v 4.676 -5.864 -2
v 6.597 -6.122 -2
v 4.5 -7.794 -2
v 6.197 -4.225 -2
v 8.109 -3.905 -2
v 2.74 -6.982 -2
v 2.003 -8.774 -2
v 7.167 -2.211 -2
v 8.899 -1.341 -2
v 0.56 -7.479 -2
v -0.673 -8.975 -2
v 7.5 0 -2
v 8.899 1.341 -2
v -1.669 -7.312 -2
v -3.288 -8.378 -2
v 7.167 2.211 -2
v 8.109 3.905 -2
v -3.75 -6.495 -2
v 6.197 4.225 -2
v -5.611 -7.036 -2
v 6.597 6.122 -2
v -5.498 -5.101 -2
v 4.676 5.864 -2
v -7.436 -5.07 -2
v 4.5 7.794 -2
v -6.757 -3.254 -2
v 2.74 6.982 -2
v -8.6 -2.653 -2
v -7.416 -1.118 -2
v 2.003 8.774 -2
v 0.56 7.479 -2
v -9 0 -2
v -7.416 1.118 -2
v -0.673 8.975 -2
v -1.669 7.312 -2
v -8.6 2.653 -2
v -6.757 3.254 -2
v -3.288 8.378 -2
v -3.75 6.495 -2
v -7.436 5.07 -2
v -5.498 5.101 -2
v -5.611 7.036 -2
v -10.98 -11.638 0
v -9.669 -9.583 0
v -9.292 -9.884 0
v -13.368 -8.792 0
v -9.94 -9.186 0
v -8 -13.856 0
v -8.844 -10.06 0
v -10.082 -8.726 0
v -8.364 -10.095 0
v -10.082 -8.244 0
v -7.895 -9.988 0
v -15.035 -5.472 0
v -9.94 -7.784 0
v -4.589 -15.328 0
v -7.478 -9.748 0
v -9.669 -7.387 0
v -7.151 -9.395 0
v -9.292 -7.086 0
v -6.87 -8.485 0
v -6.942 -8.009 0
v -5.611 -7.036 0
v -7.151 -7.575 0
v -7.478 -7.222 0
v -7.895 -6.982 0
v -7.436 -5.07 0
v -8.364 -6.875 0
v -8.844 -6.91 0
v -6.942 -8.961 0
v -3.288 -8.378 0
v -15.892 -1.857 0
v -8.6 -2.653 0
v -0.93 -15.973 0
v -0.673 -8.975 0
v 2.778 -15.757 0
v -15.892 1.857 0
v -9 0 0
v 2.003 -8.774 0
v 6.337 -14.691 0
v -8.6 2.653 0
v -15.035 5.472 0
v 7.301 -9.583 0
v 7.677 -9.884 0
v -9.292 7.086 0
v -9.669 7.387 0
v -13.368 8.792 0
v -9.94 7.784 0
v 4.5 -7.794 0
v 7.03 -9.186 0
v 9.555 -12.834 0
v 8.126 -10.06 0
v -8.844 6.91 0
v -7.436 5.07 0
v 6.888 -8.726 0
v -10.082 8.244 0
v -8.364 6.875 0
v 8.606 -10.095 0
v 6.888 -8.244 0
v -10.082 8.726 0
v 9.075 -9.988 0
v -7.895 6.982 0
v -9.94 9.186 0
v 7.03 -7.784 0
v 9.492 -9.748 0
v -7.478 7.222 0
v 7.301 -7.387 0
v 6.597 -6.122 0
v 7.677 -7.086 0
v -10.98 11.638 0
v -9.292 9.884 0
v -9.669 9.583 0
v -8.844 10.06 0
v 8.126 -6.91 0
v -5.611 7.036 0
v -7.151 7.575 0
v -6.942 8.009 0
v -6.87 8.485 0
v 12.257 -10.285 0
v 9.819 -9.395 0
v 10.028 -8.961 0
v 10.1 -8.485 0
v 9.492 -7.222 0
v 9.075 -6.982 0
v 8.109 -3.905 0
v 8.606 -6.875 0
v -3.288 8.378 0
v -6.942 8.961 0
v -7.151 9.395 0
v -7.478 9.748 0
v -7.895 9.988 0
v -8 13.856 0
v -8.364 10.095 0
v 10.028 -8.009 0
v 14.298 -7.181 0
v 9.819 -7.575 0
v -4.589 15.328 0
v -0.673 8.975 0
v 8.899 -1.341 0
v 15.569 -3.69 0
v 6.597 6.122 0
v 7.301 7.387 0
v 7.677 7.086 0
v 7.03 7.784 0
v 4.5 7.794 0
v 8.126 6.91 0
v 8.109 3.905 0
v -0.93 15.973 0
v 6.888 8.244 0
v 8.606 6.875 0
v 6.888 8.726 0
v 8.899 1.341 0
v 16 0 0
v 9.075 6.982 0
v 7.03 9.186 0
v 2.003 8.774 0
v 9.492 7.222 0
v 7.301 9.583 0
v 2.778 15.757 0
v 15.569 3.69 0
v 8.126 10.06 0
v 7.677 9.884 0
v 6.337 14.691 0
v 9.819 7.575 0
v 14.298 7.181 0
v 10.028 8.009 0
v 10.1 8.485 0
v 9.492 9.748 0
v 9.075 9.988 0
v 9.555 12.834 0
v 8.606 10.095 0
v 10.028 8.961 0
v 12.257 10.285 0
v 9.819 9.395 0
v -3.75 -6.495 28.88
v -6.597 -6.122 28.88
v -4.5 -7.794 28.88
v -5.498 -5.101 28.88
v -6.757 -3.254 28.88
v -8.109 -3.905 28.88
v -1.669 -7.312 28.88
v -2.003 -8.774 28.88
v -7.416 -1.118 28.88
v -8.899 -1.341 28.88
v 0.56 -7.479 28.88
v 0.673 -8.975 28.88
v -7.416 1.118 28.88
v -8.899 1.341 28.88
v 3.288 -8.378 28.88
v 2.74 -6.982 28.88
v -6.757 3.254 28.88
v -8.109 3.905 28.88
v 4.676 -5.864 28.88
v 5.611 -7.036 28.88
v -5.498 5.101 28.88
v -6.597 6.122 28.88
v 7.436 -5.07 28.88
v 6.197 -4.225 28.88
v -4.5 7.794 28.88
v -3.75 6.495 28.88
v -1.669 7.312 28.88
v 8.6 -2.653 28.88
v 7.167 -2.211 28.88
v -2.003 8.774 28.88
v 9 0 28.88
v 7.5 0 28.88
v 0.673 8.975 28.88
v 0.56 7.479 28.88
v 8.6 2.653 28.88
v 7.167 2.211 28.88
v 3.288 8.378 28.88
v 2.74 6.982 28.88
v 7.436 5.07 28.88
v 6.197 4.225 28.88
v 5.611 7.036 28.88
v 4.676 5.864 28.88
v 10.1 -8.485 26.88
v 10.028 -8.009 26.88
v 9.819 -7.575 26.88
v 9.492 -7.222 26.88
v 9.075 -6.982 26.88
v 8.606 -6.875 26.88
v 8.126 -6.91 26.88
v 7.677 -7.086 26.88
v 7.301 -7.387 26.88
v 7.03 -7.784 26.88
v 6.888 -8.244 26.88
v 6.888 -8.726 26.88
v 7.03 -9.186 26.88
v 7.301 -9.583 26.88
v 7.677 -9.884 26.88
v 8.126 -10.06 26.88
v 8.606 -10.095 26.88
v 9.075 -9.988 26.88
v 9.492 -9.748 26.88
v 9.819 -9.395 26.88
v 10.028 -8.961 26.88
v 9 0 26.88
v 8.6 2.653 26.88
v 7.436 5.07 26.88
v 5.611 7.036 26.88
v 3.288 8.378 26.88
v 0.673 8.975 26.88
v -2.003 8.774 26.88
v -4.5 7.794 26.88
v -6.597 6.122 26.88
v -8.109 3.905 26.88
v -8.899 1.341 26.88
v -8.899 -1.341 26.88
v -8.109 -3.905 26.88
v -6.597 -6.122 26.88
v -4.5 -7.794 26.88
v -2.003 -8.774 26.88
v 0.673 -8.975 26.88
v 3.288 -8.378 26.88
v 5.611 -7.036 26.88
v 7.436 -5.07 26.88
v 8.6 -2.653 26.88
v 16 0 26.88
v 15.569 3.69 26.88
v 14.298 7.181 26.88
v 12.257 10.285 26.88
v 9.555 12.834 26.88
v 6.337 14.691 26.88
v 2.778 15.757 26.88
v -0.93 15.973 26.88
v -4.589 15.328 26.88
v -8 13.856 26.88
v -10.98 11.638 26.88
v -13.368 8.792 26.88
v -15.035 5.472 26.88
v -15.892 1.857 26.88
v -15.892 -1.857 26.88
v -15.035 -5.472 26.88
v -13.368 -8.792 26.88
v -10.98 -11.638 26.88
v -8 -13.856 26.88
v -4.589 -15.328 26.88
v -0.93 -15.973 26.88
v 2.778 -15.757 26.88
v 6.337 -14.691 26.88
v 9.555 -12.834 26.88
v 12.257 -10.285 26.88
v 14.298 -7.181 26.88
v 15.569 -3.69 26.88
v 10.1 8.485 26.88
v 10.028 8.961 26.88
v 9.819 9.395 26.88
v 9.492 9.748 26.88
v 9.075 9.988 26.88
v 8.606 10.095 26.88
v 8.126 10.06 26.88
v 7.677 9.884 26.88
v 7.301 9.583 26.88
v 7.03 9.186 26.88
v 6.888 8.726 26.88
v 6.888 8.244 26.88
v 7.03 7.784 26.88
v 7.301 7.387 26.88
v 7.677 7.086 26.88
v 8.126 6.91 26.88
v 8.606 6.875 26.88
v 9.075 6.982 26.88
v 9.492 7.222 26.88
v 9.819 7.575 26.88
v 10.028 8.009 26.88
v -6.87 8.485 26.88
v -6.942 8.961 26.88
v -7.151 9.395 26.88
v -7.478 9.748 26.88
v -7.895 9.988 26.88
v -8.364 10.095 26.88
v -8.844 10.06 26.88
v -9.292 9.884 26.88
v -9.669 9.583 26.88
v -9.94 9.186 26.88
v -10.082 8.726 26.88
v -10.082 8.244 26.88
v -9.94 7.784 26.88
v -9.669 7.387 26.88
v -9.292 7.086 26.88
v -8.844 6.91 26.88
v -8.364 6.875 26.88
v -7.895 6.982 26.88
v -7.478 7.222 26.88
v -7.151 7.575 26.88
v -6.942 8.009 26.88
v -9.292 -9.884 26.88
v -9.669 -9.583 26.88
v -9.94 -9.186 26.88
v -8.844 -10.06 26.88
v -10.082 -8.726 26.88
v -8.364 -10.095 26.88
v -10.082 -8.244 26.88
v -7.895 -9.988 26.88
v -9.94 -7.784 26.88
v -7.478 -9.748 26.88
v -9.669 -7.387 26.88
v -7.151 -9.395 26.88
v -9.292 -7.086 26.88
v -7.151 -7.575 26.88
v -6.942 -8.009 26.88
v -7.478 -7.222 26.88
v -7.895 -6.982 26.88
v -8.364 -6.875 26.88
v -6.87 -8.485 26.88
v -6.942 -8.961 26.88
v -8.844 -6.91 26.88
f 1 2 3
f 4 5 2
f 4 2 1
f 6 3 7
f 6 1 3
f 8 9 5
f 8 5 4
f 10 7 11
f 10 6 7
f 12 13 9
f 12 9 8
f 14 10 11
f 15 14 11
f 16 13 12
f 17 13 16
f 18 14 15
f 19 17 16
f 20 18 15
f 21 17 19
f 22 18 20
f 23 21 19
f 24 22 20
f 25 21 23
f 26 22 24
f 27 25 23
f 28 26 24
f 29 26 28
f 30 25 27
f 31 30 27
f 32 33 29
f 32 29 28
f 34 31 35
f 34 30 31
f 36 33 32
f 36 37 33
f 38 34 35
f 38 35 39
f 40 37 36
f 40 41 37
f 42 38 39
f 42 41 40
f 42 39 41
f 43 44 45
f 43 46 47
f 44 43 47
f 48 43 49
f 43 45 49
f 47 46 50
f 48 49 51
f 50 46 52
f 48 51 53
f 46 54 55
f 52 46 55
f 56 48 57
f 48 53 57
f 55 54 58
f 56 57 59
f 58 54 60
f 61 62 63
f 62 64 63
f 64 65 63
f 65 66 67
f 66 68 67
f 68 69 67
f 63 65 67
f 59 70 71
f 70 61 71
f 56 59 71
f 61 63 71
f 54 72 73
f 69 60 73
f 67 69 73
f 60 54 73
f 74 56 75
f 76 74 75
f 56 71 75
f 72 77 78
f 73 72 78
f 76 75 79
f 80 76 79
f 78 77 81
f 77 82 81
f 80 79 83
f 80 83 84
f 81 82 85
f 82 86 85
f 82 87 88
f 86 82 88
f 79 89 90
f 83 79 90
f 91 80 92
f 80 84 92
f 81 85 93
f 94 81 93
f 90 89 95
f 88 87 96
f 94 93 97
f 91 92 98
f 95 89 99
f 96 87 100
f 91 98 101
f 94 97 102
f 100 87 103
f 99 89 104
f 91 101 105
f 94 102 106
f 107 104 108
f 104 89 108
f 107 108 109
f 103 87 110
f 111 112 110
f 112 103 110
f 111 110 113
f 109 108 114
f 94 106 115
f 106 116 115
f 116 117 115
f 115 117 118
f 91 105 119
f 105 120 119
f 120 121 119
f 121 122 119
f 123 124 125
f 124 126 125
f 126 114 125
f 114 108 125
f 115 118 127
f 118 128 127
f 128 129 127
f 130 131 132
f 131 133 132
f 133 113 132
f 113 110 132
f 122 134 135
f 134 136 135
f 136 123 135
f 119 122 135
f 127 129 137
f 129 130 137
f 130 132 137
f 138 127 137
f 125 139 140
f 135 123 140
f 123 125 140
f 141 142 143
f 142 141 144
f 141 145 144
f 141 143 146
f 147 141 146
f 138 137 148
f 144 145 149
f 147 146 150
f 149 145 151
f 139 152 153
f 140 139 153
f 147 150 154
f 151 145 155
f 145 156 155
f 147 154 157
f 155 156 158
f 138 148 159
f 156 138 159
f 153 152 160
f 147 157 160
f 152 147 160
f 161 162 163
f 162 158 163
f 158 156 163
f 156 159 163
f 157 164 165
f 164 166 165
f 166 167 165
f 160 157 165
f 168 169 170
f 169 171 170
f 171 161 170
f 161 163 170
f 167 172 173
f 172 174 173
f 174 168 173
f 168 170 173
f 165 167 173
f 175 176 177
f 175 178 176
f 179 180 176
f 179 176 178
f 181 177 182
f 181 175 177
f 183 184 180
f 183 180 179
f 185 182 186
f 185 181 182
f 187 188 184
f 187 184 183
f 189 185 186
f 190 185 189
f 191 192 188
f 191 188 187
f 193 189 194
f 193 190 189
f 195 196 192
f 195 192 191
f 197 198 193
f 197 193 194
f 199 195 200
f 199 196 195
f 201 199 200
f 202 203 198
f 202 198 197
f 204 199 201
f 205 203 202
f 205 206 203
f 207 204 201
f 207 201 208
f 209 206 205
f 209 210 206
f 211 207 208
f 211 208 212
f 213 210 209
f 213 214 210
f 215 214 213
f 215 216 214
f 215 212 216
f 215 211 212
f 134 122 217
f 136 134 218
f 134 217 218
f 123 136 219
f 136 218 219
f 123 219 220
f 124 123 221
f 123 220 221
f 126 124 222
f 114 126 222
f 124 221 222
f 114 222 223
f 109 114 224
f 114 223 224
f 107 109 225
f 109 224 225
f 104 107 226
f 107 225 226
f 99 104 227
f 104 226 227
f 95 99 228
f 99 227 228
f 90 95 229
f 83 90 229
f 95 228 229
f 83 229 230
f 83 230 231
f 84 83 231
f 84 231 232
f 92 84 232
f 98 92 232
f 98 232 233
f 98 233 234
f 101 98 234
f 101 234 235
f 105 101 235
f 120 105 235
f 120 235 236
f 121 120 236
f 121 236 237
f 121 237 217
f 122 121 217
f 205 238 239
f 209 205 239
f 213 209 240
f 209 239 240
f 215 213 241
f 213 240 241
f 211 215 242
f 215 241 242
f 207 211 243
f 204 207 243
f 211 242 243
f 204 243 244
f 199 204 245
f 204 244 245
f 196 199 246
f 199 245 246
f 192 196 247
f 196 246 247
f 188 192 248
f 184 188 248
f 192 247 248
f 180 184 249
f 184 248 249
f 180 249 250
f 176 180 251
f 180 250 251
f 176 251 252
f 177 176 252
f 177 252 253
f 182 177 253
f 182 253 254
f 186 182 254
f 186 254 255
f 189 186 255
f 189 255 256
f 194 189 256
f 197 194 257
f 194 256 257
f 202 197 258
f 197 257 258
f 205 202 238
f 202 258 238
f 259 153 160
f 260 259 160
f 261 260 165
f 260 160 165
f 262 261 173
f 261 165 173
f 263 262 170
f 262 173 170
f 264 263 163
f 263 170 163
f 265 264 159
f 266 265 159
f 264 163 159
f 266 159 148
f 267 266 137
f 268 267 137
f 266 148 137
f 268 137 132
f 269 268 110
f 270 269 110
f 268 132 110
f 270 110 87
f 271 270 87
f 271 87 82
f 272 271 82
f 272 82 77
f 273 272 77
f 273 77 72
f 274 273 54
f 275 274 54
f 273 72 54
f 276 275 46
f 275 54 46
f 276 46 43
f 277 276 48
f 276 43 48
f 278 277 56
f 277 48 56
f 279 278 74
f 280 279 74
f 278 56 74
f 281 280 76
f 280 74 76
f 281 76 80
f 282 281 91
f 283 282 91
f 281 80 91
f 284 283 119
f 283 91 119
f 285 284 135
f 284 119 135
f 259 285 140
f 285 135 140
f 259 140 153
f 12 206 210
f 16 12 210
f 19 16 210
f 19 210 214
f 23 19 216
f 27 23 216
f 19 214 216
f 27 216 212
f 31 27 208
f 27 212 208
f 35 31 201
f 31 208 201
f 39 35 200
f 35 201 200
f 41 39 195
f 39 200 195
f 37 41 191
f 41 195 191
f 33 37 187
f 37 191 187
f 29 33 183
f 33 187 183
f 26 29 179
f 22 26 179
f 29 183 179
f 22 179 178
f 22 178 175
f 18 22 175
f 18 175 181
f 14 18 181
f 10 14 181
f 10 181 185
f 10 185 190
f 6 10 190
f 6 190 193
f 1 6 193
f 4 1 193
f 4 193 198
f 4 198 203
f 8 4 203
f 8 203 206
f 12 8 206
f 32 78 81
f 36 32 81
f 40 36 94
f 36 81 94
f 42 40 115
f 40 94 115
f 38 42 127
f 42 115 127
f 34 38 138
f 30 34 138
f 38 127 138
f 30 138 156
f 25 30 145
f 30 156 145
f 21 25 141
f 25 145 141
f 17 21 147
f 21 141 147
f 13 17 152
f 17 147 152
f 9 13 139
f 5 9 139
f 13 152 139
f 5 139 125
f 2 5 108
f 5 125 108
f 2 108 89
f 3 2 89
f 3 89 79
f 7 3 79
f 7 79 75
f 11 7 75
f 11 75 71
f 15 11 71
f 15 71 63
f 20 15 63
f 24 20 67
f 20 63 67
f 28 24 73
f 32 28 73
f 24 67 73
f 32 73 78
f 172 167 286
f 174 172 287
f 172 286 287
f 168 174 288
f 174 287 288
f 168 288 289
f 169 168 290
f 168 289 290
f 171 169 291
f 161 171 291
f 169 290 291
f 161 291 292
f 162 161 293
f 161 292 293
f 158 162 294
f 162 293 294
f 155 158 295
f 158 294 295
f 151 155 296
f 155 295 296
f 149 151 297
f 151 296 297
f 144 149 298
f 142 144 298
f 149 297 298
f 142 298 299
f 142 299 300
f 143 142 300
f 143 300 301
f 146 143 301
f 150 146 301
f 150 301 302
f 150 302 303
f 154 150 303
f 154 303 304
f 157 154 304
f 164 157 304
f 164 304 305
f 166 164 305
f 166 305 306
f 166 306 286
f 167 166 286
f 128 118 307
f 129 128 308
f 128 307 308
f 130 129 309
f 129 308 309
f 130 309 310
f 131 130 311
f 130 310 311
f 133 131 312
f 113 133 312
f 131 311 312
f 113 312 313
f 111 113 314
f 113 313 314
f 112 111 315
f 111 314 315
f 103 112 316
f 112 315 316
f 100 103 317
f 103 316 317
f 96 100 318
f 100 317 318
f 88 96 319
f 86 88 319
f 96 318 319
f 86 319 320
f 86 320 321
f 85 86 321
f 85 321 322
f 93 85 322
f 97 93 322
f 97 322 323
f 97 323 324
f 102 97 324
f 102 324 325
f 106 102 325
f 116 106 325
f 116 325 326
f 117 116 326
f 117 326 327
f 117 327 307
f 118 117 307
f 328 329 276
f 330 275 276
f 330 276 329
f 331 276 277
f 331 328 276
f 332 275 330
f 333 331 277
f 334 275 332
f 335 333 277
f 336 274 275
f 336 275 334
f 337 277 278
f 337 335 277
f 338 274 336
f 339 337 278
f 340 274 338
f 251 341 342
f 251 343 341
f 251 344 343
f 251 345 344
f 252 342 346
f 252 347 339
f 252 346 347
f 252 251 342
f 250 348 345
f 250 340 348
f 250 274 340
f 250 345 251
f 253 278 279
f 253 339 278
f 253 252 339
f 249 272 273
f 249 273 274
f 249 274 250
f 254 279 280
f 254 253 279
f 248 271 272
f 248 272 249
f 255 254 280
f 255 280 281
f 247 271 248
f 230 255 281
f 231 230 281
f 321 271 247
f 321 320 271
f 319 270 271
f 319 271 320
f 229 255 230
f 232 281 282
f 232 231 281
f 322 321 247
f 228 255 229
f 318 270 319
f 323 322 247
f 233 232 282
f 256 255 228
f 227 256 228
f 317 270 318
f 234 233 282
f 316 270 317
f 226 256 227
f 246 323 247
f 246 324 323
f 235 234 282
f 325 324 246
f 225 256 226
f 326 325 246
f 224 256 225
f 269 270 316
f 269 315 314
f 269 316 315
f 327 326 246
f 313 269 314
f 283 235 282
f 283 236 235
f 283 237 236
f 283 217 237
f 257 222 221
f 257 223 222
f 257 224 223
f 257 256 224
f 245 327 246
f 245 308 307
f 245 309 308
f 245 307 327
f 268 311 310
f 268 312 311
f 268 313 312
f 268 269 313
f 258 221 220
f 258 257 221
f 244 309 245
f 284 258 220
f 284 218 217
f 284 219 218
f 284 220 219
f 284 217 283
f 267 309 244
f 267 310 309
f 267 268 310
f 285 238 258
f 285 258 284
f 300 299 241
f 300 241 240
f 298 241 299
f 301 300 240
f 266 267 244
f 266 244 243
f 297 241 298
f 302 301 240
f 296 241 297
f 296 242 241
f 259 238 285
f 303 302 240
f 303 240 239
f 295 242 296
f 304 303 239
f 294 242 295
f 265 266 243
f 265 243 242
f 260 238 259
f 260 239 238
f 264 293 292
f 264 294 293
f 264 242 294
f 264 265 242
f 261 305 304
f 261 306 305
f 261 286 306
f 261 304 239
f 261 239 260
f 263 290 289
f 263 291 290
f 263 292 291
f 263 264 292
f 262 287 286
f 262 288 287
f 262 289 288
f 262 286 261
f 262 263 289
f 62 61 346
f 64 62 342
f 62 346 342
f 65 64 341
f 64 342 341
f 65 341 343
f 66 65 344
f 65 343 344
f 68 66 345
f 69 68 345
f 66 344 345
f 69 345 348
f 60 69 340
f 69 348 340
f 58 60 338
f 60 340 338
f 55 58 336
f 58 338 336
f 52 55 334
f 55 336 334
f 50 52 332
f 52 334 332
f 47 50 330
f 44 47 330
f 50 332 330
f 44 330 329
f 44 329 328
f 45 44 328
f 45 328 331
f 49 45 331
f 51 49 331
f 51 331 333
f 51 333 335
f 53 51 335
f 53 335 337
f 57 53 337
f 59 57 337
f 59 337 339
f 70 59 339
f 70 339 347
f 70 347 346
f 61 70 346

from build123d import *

# Parameters (mm, degrees)
SKETCH1_R           = 16
BOSS_EXTRUDE1_DEPTH = 26.88
SKETCH4_R           = 9
BOSS_EXTRUDE2_DEPTH = 2
SKETCH5_R           = 9
BOSS_EXTRUDE3_DEPTH = 2
SKETCH6_R           = 7.5
CUT_EXTRUDE2_DEPTH  = 31.88
SKETCH7_R           = 1.615
CUT_EXTRUDE3_DEPTH  = 29.88


with BuildPart() as part:
    # Sketch1 → Boss-Extrude1 (new body)
    with BuildSketch(Plane.XY):
        Circle(SKETCH1_R)
    extrude(amount=BOSS_EXTRUDE1_DEPTH)

    # Sketch4 → Boss-Extrude2 (add)
    with BuildSketch(Plane.XY.offset(26.88)):
        Circle(SKETCH4_R)
    extrude(amount=BOSS_EXTRUDE2_DEPTH)

    # Sketch5 → Boss-Extrude3 (add)
    with BuildSketch(Plane(origin=(0, 0, 0), x_dir=(-1, 0, 0), z_dir=(0, 0, -1))):
        Circle(SKETCH5_R)
    extrude(amount=BOSS_EXTRUDE3_DEPTH)

    # Sketch6 → Cut-Extrude2 (cut, through all)
    with BuildSketch(Plane.XY.offset(28.88)):
        Circle(SKETCH6_R)
    extrude(amount=-CUT_EXTRUDE2_DEPTH, mode=Mode.SUBTRACT)

    # Sketch7 → Cut-Extrude3 (cut, through all)
    with BuildSketch(Plane.XY.offset(26.88)):
        with Locations((-8.485, 8.485)):
            Circle(SKETCH7_R)
        with Locations((8.485, 8.485)):
            Circle(SKETCH7_R)
        with Locations((8.485, -8.485)):
            Circle(SKETCH7_R)
        with Locations((-8.485, -8.485)):
            Circle(SKETCH7_R)
    extrude(amount=-CUT_EXTRUDE3_DEPTH, mode=Mode.SUBTRACT)


solid = part.part
